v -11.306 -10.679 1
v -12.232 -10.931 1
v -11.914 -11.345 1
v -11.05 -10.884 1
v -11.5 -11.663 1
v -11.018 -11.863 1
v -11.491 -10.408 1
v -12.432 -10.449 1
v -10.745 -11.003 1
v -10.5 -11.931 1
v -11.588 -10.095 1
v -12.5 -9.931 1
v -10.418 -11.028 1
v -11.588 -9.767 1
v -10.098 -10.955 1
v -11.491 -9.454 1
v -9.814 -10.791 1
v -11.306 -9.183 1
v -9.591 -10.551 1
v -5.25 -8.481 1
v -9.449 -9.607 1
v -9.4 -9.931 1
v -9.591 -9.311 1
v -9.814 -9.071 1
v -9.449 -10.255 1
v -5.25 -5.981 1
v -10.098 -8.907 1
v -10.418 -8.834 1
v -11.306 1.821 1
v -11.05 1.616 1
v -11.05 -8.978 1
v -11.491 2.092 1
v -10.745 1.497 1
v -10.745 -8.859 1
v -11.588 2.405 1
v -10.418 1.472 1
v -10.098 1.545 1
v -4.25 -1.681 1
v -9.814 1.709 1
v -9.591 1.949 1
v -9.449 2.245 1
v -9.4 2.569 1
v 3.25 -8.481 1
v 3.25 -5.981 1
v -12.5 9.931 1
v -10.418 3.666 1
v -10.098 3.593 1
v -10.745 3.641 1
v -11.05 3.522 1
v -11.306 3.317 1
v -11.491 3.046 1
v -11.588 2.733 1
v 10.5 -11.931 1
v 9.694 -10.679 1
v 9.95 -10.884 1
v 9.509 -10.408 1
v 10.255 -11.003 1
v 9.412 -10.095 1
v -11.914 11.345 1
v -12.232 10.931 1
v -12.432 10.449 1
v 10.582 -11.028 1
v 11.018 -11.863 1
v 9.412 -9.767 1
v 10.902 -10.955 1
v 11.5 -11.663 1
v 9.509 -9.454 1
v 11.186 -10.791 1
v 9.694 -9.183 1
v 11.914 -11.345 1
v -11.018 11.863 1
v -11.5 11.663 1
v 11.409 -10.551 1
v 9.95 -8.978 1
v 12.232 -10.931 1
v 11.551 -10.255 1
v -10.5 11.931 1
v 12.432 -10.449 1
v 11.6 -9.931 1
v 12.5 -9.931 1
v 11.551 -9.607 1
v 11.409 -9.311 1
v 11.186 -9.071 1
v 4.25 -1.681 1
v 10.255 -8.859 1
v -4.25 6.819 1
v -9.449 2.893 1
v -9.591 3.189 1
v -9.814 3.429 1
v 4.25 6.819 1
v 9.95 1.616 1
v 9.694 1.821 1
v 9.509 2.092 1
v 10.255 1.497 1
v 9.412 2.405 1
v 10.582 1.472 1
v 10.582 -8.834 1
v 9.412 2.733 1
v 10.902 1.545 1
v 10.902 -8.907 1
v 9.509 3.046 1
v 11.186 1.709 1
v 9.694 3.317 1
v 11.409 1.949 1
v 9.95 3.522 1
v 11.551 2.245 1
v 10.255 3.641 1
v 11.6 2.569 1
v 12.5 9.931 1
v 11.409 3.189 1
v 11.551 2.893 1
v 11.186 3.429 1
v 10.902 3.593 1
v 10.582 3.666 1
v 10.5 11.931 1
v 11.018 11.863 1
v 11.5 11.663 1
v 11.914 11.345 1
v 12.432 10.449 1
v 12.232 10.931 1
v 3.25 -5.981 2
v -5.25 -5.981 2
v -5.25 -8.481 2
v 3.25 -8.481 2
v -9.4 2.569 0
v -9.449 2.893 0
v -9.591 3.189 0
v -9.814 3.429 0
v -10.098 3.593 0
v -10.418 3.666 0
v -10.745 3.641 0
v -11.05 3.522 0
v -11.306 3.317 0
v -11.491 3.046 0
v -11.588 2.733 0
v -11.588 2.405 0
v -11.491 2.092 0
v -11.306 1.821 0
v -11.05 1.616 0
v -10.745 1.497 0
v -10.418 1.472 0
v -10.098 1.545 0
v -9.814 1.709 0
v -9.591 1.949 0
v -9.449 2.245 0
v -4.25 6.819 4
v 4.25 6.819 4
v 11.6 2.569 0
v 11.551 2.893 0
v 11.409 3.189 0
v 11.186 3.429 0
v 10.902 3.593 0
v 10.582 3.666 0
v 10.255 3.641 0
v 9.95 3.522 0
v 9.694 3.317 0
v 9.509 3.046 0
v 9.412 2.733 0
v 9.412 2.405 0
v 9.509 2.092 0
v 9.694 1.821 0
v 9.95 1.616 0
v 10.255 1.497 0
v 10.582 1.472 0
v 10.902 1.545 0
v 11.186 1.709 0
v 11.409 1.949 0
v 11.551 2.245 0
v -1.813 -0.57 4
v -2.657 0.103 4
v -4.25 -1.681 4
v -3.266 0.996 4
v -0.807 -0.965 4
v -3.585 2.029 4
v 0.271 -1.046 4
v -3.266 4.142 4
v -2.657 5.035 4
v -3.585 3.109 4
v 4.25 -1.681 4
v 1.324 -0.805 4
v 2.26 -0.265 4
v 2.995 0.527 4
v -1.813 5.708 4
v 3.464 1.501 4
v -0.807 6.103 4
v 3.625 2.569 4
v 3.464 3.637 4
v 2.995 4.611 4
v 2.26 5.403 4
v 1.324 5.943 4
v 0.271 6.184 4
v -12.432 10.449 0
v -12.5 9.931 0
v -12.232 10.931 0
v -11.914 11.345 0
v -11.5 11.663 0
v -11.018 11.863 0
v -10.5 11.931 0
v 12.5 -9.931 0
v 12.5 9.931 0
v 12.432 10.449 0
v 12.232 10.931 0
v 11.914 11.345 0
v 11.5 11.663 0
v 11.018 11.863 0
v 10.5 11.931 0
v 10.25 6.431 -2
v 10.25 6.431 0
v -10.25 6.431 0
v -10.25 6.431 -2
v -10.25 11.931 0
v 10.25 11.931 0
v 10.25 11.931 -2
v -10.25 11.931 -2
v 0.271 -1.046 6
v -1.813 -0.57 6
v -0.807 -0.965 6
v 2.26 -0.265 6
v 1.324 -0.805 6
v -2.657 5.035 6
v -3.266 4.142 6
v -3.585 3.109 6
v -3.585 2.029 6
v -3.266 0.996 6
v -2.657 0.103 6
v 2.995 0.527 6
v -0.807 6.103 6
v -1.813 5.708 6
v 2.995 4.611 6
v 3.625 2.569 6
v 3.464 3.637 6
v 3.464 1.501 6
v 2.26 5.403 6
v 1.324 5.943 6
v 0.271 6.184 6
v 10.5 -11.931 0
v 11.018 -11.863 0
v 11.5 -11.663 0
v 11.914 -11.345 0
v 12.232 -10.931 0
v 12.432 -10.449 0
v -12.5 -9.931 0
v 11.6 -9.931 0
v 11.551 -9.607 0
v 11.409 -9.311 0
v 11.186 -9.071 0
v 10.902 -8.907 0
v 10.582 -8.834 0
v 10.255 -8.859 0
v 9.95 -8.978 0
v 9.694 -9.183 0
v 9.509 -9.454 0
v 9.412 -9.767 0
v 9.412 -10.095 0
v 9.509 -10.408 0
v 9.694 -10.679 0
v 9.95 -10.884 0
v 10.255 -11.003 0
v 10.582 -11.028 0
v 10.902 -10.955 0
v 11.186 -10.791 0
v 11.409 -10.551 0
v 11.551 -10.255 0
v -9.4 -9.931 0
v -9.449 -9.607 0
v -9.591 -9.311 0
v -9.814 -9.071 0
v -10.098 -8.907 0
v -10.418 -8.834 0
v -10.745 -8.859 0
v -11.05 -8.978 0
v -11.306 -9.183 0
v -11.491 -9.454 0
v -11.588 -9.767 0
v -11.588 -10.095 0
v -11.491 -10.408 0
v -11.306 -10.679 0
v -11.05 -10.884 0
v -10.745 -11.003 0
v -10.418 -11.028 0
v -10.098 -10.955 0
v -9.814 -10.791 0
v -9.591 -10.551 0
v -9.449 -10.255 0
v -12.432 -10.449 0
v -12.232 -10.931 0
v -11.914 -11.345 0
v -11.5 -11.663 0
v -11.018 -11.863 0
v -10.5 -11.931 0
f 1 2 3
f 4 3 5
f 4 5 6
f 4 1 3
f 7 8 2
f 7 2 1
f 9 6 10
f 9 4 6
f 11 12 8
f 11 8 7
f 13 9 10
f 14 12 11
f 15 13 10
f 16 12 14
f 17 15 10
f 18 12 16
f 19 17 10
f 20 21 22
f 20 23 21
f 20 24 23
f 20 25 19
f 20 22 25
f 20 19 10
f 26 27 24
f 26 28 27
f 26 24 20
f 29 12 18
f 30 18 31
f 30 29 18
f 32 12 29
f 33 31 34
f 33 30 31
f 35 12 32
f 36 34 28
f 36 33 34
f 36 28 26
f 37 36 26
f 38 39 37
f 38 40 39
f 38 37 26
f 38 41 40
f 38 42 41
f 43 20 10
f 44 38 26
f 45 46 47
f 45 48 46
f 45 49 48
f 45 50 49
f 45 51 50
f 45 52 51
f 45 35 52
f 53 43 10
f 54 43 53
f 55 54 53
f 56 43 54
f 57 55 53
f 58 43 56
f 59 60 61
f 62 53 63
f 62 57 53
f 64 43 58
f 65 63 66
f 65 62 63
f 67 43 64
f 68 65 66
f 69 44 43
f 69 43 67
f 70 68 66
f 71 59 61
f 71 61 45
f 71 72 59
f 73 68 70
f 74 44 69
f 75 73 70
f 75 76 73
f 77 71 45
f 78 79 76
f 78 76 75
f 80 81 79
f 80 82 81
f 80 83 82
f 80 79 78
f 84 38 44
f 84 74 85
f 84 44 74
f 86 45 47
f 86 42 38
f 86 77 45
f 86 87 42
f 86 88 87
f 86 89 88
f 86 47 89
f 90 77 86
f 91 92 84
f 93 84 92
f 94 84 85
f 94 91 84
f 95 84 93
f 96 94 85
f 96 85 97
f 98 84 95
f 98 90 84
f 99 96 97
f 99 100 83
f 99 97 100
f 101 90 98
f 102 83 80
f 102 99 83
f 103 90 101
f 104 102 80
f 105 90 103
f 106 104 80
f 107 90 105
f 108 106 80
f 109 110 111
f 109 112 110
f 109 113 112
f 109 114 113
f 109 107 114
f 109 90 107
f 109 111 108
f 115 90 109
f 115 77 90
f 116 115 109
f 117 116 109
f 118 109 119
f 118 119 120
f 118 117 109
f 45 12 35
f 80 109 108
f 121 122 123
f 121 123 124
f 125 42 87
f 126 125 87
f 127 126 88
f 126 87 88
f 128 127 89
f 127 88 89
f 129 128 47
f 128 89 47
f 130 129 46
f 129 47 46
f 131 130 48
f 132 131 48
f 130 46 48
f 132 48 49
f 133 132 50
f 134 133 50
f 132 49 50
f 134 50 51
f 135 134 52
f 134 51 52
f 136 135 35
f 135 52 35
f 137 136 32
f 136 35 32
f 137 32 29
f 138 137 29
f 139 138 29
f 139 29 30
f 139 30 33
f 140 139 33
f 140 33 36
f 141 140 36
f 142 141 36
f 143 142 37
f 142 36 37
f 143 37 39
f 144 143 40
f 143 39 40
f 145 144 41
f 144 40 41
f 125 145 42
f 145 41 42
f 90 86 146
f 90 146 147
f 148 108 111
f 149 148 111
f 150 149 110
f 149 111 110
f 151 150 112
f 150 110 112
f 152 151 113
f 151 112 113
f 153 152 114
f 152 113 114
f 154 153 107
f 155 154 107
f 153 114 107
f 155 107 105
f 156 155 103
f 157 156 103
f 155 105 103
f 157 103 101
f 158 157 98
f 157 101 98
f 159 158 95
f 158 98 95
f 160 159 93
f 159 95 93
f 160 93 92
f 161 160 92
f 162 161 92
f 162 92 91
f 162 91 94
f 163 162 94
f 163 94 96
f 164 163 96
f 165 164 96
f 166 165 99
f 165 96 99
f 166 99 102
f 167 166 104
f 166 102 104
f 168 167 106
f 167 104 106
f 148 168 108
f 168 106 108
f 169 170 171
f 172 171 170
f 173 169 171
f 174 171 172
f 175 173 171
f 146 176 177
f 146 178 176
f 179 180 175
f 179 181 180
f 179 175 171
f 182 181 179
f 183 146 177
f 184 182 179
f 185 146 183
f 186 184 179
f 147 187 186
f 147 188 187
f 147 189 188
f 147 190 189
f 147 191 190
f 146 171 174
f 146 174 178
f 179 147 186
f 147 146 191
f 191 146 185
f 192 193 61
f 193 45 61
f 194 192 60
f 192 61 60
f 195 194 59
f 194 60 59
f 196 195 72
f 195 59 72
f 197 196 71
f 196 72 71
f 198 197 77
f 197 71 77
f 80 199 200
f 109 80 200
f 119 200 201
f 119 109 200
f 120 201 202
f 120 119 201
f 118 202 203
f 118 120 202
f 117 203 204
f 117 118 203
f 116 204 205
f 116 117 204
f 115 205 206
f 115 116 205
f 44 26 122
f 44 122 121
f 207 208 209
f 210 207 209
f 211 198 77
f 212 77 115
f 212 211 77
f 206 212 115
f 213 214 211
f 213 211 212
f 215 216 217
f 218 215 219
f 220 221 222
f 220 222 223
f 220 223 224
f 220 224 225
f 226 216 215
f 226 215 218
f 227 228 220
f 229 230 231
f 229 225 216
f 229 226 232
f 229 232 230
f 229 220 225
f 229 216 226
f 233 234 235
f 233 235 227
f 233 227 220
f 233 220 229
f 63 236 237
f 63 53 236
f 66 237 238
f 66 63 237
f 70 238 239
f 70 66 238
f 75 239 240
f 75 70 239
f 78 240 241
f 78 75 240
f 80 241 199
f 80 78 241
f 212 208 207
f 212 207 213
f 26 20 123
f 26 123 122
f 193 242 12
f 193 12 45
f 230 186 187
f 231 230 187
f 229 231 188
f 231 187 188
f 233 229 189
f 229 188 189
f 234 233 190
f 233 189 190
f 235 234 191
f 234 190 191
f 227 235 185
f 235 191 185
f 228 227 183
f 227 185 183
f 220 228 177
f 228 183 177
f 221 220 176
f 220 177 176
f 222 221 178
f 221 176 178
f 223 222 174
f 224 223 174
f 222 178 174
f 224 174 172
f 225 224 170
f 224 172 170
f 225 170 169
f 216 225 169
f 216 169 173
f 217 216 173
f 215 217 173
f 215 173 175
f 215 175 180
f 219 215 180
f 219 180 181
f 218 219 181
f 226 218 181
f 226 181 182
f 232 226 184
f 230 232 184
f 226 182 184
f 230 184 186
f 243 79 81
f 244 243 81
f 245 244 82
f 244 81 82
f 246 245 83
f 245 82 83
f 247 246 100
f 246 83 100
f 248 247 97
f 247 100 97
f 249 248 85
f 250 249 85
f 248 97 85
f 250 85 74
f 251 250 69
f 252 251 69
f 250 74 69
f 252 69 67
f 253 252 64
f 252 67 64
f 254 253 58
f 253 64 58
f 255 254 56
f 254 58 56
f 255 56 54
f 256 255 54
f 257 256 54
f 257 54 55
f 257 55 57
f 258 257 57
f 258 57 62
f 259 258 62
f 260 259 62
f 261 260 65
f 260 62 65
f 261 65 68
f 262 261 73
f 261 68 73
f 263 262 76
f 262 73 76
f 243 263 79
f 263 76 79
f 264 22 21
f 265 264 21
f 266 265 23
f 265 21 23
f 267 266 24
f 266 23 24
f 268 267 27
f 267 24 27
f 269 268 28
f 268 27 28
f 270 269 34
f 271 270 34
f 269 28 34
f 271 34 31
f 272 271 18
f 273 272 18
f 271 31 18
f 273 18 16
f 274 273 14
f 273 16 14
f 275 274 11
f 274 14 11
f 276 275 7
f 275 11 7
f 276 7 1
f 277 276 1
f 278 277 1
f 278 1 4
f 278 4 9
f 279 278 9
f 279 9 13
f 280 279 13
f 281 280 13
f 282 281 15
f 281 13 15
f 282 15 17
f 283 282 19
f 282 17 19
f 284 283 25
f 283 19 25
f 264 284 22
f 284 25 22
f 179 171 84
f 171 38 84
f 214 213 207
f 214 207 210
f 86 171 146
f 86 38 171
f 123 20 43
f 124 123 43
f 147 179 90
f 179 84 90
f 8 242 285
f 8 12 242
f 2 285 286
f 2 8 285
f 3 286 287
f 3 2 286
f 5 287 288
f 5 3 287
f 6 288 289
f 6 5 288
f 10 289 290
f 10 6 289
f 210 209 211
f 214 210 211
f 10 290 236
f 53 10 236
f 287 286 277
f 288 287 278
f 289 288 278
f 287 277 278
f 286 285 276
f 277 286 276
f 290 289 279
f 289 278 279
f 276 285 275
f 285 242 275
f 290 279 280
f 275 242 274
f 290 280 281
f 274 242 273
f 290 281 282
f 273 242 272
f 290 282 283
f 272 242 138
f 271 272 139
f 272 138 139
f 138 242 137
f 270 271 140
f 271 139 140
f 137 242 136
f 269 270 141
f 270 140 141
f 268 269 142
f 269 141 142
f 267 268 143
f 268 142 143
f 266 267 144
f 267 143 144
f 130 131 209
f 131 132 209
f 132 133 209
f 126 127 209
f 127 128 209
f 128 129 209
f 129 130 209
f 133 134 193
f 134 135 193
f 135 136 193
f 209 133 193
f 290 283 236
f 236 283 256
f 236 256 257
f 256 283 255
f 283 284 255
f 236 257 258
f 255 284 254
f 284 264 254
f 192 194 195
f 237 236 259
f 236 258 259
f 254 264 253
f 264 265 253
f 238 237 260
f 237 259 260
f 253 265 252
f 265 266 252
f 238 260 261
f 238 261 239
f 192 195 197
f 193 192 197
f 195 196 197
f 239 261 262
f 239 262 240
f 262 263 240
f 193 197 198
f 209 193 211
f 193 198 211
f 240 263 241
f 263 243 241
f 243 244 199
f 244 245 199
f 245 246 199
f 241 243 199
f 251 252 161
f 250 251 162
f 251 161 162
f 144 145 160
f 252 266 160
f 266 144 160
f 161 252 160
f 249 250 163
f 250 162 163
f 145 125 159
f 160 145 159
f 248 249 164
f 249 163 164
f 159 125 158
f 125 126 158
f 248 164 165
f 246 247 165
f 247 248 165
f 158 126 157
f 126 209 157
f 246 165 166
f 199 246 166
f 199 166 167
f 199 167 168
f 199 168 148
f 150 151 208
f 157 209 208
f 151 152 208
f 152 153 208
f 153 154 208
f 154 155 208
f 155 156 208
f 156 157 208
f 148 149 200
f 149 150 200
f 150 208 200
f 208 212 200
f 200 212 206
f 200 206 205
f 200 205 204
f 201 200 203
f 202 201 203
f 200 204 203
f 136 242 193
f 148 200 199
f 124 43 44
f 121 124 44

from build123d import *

# Parameters (mm, degrees)
SKETCH1_W           = 25
SKETCH1_H           = 23.862
BOSS_EXTRUDE1_DEPTH = 1
FILLET1_R           = 2
SKETCH2_R           = 1.1
CUT_EXTRUDE1_DEPTH  = 1
SKETCH3_W           = 8.5
SKETCH3_H           = 2.5
SKETCH3_H_2         = 8.5
BOSS_EXTRUDE2_DEPTH = 1
SKETCH4_W           = 8.5
SKETCH4_H           = 8.5
BOSS_EXTRUDE3_DEPTH = 2
SKETCH5_R           = 3.625
BOSS_EXTRUDE4_DEPTH = 2
SKETCH6_W           = 20.5
SKETCH6_H           = 5.5
BOSS_EXTRUDE5_DEPTH = 2


with BuildPart() as part:
    # Sketch1 → Boss-Extrude1 (new body)
    with BuildSketch(Plane.XY):
        Rectangle(SKETCH1_W, SKETCH1_H)
    extrude(amount=BOSS_EXTRUDE1_DEPTH)

    # Fillet1
    fillet1_edges = [part.edges().sort_by_distance(p)[0] for p in [
        (12.5, -11.931, 0.5),
        (-12.5, -11.931, 0.5),
        (-12.5, 11.931, 0.5),
        (12.5, 11.931, 0.5),
    ]]
    fillet(fillet1_edges, radius=FILLET1_R)

    # Sketch2 → Cut-Extrude1 (cut)
    with BuildSketch(Plane.XY.offset(1)):
        with Locations((-10.5, -9.931)):
            Circle(SKETCH2_R)
        with Locations((10.5, -9.931)):
            Circle(SKETCH2_R)
        with Locations((10.5, 2.569)):
            Circle(SKETCH2_R)
        with Locations((-10.5, 2.569)):
            Circle(SKETCH2_R)
    extrude(amount=-CUT_EXTRUDE1_DEPTH, mode=Mode.SUBTRACT)

    # Sketch3 → Boss-Extrude2 (add)
    with BuildSketch(Plane.XY.offset(1)):
        with Locations((-1, -7.231)):
            Rectangle(SKETCH3_W, SKETCH3_H)
        with Locations((0, 2.569)):
            Rectangle(SKETCH3_W, SKETCH3_H_2)
    extrude(amount=BOSS_EXTRUDE2_DEPTH)

    # Sketch4 → Boss-Extrude3 (add)
    with BuildSketch(Plane.XY.offset(2)):
        with Locations((0, 2.569)):
            Rectangle(SKETCH4_W, SKETCH4_H)
    extrude(amount=BOSS_EXTRUDE3_DEPTH)

    # Sketch5 → Boss-Extrude4 (add)
    with BuildSketch(Plane.XY.offset(4)):
        with Locations((0, 2.569)):
            Circle(SKETCH5_R)
    extrude(amount=BOSS_EXTRUDE4_DEPTH)

    # Sketch6 → Boss-Extrude5 (add)
    with BuildSketch(Plane(origin=(0, 0, 0), x_dir=(-1, 0, 0), z_dir=(0, 0, -1))):
        with Locations((0, 9.181)):
            Rectangle(SKETCH6_W, SKETCH6_H)
    extrude(amount=BOSS_EXTRUDE5_DEPTH)


solid = part.part
